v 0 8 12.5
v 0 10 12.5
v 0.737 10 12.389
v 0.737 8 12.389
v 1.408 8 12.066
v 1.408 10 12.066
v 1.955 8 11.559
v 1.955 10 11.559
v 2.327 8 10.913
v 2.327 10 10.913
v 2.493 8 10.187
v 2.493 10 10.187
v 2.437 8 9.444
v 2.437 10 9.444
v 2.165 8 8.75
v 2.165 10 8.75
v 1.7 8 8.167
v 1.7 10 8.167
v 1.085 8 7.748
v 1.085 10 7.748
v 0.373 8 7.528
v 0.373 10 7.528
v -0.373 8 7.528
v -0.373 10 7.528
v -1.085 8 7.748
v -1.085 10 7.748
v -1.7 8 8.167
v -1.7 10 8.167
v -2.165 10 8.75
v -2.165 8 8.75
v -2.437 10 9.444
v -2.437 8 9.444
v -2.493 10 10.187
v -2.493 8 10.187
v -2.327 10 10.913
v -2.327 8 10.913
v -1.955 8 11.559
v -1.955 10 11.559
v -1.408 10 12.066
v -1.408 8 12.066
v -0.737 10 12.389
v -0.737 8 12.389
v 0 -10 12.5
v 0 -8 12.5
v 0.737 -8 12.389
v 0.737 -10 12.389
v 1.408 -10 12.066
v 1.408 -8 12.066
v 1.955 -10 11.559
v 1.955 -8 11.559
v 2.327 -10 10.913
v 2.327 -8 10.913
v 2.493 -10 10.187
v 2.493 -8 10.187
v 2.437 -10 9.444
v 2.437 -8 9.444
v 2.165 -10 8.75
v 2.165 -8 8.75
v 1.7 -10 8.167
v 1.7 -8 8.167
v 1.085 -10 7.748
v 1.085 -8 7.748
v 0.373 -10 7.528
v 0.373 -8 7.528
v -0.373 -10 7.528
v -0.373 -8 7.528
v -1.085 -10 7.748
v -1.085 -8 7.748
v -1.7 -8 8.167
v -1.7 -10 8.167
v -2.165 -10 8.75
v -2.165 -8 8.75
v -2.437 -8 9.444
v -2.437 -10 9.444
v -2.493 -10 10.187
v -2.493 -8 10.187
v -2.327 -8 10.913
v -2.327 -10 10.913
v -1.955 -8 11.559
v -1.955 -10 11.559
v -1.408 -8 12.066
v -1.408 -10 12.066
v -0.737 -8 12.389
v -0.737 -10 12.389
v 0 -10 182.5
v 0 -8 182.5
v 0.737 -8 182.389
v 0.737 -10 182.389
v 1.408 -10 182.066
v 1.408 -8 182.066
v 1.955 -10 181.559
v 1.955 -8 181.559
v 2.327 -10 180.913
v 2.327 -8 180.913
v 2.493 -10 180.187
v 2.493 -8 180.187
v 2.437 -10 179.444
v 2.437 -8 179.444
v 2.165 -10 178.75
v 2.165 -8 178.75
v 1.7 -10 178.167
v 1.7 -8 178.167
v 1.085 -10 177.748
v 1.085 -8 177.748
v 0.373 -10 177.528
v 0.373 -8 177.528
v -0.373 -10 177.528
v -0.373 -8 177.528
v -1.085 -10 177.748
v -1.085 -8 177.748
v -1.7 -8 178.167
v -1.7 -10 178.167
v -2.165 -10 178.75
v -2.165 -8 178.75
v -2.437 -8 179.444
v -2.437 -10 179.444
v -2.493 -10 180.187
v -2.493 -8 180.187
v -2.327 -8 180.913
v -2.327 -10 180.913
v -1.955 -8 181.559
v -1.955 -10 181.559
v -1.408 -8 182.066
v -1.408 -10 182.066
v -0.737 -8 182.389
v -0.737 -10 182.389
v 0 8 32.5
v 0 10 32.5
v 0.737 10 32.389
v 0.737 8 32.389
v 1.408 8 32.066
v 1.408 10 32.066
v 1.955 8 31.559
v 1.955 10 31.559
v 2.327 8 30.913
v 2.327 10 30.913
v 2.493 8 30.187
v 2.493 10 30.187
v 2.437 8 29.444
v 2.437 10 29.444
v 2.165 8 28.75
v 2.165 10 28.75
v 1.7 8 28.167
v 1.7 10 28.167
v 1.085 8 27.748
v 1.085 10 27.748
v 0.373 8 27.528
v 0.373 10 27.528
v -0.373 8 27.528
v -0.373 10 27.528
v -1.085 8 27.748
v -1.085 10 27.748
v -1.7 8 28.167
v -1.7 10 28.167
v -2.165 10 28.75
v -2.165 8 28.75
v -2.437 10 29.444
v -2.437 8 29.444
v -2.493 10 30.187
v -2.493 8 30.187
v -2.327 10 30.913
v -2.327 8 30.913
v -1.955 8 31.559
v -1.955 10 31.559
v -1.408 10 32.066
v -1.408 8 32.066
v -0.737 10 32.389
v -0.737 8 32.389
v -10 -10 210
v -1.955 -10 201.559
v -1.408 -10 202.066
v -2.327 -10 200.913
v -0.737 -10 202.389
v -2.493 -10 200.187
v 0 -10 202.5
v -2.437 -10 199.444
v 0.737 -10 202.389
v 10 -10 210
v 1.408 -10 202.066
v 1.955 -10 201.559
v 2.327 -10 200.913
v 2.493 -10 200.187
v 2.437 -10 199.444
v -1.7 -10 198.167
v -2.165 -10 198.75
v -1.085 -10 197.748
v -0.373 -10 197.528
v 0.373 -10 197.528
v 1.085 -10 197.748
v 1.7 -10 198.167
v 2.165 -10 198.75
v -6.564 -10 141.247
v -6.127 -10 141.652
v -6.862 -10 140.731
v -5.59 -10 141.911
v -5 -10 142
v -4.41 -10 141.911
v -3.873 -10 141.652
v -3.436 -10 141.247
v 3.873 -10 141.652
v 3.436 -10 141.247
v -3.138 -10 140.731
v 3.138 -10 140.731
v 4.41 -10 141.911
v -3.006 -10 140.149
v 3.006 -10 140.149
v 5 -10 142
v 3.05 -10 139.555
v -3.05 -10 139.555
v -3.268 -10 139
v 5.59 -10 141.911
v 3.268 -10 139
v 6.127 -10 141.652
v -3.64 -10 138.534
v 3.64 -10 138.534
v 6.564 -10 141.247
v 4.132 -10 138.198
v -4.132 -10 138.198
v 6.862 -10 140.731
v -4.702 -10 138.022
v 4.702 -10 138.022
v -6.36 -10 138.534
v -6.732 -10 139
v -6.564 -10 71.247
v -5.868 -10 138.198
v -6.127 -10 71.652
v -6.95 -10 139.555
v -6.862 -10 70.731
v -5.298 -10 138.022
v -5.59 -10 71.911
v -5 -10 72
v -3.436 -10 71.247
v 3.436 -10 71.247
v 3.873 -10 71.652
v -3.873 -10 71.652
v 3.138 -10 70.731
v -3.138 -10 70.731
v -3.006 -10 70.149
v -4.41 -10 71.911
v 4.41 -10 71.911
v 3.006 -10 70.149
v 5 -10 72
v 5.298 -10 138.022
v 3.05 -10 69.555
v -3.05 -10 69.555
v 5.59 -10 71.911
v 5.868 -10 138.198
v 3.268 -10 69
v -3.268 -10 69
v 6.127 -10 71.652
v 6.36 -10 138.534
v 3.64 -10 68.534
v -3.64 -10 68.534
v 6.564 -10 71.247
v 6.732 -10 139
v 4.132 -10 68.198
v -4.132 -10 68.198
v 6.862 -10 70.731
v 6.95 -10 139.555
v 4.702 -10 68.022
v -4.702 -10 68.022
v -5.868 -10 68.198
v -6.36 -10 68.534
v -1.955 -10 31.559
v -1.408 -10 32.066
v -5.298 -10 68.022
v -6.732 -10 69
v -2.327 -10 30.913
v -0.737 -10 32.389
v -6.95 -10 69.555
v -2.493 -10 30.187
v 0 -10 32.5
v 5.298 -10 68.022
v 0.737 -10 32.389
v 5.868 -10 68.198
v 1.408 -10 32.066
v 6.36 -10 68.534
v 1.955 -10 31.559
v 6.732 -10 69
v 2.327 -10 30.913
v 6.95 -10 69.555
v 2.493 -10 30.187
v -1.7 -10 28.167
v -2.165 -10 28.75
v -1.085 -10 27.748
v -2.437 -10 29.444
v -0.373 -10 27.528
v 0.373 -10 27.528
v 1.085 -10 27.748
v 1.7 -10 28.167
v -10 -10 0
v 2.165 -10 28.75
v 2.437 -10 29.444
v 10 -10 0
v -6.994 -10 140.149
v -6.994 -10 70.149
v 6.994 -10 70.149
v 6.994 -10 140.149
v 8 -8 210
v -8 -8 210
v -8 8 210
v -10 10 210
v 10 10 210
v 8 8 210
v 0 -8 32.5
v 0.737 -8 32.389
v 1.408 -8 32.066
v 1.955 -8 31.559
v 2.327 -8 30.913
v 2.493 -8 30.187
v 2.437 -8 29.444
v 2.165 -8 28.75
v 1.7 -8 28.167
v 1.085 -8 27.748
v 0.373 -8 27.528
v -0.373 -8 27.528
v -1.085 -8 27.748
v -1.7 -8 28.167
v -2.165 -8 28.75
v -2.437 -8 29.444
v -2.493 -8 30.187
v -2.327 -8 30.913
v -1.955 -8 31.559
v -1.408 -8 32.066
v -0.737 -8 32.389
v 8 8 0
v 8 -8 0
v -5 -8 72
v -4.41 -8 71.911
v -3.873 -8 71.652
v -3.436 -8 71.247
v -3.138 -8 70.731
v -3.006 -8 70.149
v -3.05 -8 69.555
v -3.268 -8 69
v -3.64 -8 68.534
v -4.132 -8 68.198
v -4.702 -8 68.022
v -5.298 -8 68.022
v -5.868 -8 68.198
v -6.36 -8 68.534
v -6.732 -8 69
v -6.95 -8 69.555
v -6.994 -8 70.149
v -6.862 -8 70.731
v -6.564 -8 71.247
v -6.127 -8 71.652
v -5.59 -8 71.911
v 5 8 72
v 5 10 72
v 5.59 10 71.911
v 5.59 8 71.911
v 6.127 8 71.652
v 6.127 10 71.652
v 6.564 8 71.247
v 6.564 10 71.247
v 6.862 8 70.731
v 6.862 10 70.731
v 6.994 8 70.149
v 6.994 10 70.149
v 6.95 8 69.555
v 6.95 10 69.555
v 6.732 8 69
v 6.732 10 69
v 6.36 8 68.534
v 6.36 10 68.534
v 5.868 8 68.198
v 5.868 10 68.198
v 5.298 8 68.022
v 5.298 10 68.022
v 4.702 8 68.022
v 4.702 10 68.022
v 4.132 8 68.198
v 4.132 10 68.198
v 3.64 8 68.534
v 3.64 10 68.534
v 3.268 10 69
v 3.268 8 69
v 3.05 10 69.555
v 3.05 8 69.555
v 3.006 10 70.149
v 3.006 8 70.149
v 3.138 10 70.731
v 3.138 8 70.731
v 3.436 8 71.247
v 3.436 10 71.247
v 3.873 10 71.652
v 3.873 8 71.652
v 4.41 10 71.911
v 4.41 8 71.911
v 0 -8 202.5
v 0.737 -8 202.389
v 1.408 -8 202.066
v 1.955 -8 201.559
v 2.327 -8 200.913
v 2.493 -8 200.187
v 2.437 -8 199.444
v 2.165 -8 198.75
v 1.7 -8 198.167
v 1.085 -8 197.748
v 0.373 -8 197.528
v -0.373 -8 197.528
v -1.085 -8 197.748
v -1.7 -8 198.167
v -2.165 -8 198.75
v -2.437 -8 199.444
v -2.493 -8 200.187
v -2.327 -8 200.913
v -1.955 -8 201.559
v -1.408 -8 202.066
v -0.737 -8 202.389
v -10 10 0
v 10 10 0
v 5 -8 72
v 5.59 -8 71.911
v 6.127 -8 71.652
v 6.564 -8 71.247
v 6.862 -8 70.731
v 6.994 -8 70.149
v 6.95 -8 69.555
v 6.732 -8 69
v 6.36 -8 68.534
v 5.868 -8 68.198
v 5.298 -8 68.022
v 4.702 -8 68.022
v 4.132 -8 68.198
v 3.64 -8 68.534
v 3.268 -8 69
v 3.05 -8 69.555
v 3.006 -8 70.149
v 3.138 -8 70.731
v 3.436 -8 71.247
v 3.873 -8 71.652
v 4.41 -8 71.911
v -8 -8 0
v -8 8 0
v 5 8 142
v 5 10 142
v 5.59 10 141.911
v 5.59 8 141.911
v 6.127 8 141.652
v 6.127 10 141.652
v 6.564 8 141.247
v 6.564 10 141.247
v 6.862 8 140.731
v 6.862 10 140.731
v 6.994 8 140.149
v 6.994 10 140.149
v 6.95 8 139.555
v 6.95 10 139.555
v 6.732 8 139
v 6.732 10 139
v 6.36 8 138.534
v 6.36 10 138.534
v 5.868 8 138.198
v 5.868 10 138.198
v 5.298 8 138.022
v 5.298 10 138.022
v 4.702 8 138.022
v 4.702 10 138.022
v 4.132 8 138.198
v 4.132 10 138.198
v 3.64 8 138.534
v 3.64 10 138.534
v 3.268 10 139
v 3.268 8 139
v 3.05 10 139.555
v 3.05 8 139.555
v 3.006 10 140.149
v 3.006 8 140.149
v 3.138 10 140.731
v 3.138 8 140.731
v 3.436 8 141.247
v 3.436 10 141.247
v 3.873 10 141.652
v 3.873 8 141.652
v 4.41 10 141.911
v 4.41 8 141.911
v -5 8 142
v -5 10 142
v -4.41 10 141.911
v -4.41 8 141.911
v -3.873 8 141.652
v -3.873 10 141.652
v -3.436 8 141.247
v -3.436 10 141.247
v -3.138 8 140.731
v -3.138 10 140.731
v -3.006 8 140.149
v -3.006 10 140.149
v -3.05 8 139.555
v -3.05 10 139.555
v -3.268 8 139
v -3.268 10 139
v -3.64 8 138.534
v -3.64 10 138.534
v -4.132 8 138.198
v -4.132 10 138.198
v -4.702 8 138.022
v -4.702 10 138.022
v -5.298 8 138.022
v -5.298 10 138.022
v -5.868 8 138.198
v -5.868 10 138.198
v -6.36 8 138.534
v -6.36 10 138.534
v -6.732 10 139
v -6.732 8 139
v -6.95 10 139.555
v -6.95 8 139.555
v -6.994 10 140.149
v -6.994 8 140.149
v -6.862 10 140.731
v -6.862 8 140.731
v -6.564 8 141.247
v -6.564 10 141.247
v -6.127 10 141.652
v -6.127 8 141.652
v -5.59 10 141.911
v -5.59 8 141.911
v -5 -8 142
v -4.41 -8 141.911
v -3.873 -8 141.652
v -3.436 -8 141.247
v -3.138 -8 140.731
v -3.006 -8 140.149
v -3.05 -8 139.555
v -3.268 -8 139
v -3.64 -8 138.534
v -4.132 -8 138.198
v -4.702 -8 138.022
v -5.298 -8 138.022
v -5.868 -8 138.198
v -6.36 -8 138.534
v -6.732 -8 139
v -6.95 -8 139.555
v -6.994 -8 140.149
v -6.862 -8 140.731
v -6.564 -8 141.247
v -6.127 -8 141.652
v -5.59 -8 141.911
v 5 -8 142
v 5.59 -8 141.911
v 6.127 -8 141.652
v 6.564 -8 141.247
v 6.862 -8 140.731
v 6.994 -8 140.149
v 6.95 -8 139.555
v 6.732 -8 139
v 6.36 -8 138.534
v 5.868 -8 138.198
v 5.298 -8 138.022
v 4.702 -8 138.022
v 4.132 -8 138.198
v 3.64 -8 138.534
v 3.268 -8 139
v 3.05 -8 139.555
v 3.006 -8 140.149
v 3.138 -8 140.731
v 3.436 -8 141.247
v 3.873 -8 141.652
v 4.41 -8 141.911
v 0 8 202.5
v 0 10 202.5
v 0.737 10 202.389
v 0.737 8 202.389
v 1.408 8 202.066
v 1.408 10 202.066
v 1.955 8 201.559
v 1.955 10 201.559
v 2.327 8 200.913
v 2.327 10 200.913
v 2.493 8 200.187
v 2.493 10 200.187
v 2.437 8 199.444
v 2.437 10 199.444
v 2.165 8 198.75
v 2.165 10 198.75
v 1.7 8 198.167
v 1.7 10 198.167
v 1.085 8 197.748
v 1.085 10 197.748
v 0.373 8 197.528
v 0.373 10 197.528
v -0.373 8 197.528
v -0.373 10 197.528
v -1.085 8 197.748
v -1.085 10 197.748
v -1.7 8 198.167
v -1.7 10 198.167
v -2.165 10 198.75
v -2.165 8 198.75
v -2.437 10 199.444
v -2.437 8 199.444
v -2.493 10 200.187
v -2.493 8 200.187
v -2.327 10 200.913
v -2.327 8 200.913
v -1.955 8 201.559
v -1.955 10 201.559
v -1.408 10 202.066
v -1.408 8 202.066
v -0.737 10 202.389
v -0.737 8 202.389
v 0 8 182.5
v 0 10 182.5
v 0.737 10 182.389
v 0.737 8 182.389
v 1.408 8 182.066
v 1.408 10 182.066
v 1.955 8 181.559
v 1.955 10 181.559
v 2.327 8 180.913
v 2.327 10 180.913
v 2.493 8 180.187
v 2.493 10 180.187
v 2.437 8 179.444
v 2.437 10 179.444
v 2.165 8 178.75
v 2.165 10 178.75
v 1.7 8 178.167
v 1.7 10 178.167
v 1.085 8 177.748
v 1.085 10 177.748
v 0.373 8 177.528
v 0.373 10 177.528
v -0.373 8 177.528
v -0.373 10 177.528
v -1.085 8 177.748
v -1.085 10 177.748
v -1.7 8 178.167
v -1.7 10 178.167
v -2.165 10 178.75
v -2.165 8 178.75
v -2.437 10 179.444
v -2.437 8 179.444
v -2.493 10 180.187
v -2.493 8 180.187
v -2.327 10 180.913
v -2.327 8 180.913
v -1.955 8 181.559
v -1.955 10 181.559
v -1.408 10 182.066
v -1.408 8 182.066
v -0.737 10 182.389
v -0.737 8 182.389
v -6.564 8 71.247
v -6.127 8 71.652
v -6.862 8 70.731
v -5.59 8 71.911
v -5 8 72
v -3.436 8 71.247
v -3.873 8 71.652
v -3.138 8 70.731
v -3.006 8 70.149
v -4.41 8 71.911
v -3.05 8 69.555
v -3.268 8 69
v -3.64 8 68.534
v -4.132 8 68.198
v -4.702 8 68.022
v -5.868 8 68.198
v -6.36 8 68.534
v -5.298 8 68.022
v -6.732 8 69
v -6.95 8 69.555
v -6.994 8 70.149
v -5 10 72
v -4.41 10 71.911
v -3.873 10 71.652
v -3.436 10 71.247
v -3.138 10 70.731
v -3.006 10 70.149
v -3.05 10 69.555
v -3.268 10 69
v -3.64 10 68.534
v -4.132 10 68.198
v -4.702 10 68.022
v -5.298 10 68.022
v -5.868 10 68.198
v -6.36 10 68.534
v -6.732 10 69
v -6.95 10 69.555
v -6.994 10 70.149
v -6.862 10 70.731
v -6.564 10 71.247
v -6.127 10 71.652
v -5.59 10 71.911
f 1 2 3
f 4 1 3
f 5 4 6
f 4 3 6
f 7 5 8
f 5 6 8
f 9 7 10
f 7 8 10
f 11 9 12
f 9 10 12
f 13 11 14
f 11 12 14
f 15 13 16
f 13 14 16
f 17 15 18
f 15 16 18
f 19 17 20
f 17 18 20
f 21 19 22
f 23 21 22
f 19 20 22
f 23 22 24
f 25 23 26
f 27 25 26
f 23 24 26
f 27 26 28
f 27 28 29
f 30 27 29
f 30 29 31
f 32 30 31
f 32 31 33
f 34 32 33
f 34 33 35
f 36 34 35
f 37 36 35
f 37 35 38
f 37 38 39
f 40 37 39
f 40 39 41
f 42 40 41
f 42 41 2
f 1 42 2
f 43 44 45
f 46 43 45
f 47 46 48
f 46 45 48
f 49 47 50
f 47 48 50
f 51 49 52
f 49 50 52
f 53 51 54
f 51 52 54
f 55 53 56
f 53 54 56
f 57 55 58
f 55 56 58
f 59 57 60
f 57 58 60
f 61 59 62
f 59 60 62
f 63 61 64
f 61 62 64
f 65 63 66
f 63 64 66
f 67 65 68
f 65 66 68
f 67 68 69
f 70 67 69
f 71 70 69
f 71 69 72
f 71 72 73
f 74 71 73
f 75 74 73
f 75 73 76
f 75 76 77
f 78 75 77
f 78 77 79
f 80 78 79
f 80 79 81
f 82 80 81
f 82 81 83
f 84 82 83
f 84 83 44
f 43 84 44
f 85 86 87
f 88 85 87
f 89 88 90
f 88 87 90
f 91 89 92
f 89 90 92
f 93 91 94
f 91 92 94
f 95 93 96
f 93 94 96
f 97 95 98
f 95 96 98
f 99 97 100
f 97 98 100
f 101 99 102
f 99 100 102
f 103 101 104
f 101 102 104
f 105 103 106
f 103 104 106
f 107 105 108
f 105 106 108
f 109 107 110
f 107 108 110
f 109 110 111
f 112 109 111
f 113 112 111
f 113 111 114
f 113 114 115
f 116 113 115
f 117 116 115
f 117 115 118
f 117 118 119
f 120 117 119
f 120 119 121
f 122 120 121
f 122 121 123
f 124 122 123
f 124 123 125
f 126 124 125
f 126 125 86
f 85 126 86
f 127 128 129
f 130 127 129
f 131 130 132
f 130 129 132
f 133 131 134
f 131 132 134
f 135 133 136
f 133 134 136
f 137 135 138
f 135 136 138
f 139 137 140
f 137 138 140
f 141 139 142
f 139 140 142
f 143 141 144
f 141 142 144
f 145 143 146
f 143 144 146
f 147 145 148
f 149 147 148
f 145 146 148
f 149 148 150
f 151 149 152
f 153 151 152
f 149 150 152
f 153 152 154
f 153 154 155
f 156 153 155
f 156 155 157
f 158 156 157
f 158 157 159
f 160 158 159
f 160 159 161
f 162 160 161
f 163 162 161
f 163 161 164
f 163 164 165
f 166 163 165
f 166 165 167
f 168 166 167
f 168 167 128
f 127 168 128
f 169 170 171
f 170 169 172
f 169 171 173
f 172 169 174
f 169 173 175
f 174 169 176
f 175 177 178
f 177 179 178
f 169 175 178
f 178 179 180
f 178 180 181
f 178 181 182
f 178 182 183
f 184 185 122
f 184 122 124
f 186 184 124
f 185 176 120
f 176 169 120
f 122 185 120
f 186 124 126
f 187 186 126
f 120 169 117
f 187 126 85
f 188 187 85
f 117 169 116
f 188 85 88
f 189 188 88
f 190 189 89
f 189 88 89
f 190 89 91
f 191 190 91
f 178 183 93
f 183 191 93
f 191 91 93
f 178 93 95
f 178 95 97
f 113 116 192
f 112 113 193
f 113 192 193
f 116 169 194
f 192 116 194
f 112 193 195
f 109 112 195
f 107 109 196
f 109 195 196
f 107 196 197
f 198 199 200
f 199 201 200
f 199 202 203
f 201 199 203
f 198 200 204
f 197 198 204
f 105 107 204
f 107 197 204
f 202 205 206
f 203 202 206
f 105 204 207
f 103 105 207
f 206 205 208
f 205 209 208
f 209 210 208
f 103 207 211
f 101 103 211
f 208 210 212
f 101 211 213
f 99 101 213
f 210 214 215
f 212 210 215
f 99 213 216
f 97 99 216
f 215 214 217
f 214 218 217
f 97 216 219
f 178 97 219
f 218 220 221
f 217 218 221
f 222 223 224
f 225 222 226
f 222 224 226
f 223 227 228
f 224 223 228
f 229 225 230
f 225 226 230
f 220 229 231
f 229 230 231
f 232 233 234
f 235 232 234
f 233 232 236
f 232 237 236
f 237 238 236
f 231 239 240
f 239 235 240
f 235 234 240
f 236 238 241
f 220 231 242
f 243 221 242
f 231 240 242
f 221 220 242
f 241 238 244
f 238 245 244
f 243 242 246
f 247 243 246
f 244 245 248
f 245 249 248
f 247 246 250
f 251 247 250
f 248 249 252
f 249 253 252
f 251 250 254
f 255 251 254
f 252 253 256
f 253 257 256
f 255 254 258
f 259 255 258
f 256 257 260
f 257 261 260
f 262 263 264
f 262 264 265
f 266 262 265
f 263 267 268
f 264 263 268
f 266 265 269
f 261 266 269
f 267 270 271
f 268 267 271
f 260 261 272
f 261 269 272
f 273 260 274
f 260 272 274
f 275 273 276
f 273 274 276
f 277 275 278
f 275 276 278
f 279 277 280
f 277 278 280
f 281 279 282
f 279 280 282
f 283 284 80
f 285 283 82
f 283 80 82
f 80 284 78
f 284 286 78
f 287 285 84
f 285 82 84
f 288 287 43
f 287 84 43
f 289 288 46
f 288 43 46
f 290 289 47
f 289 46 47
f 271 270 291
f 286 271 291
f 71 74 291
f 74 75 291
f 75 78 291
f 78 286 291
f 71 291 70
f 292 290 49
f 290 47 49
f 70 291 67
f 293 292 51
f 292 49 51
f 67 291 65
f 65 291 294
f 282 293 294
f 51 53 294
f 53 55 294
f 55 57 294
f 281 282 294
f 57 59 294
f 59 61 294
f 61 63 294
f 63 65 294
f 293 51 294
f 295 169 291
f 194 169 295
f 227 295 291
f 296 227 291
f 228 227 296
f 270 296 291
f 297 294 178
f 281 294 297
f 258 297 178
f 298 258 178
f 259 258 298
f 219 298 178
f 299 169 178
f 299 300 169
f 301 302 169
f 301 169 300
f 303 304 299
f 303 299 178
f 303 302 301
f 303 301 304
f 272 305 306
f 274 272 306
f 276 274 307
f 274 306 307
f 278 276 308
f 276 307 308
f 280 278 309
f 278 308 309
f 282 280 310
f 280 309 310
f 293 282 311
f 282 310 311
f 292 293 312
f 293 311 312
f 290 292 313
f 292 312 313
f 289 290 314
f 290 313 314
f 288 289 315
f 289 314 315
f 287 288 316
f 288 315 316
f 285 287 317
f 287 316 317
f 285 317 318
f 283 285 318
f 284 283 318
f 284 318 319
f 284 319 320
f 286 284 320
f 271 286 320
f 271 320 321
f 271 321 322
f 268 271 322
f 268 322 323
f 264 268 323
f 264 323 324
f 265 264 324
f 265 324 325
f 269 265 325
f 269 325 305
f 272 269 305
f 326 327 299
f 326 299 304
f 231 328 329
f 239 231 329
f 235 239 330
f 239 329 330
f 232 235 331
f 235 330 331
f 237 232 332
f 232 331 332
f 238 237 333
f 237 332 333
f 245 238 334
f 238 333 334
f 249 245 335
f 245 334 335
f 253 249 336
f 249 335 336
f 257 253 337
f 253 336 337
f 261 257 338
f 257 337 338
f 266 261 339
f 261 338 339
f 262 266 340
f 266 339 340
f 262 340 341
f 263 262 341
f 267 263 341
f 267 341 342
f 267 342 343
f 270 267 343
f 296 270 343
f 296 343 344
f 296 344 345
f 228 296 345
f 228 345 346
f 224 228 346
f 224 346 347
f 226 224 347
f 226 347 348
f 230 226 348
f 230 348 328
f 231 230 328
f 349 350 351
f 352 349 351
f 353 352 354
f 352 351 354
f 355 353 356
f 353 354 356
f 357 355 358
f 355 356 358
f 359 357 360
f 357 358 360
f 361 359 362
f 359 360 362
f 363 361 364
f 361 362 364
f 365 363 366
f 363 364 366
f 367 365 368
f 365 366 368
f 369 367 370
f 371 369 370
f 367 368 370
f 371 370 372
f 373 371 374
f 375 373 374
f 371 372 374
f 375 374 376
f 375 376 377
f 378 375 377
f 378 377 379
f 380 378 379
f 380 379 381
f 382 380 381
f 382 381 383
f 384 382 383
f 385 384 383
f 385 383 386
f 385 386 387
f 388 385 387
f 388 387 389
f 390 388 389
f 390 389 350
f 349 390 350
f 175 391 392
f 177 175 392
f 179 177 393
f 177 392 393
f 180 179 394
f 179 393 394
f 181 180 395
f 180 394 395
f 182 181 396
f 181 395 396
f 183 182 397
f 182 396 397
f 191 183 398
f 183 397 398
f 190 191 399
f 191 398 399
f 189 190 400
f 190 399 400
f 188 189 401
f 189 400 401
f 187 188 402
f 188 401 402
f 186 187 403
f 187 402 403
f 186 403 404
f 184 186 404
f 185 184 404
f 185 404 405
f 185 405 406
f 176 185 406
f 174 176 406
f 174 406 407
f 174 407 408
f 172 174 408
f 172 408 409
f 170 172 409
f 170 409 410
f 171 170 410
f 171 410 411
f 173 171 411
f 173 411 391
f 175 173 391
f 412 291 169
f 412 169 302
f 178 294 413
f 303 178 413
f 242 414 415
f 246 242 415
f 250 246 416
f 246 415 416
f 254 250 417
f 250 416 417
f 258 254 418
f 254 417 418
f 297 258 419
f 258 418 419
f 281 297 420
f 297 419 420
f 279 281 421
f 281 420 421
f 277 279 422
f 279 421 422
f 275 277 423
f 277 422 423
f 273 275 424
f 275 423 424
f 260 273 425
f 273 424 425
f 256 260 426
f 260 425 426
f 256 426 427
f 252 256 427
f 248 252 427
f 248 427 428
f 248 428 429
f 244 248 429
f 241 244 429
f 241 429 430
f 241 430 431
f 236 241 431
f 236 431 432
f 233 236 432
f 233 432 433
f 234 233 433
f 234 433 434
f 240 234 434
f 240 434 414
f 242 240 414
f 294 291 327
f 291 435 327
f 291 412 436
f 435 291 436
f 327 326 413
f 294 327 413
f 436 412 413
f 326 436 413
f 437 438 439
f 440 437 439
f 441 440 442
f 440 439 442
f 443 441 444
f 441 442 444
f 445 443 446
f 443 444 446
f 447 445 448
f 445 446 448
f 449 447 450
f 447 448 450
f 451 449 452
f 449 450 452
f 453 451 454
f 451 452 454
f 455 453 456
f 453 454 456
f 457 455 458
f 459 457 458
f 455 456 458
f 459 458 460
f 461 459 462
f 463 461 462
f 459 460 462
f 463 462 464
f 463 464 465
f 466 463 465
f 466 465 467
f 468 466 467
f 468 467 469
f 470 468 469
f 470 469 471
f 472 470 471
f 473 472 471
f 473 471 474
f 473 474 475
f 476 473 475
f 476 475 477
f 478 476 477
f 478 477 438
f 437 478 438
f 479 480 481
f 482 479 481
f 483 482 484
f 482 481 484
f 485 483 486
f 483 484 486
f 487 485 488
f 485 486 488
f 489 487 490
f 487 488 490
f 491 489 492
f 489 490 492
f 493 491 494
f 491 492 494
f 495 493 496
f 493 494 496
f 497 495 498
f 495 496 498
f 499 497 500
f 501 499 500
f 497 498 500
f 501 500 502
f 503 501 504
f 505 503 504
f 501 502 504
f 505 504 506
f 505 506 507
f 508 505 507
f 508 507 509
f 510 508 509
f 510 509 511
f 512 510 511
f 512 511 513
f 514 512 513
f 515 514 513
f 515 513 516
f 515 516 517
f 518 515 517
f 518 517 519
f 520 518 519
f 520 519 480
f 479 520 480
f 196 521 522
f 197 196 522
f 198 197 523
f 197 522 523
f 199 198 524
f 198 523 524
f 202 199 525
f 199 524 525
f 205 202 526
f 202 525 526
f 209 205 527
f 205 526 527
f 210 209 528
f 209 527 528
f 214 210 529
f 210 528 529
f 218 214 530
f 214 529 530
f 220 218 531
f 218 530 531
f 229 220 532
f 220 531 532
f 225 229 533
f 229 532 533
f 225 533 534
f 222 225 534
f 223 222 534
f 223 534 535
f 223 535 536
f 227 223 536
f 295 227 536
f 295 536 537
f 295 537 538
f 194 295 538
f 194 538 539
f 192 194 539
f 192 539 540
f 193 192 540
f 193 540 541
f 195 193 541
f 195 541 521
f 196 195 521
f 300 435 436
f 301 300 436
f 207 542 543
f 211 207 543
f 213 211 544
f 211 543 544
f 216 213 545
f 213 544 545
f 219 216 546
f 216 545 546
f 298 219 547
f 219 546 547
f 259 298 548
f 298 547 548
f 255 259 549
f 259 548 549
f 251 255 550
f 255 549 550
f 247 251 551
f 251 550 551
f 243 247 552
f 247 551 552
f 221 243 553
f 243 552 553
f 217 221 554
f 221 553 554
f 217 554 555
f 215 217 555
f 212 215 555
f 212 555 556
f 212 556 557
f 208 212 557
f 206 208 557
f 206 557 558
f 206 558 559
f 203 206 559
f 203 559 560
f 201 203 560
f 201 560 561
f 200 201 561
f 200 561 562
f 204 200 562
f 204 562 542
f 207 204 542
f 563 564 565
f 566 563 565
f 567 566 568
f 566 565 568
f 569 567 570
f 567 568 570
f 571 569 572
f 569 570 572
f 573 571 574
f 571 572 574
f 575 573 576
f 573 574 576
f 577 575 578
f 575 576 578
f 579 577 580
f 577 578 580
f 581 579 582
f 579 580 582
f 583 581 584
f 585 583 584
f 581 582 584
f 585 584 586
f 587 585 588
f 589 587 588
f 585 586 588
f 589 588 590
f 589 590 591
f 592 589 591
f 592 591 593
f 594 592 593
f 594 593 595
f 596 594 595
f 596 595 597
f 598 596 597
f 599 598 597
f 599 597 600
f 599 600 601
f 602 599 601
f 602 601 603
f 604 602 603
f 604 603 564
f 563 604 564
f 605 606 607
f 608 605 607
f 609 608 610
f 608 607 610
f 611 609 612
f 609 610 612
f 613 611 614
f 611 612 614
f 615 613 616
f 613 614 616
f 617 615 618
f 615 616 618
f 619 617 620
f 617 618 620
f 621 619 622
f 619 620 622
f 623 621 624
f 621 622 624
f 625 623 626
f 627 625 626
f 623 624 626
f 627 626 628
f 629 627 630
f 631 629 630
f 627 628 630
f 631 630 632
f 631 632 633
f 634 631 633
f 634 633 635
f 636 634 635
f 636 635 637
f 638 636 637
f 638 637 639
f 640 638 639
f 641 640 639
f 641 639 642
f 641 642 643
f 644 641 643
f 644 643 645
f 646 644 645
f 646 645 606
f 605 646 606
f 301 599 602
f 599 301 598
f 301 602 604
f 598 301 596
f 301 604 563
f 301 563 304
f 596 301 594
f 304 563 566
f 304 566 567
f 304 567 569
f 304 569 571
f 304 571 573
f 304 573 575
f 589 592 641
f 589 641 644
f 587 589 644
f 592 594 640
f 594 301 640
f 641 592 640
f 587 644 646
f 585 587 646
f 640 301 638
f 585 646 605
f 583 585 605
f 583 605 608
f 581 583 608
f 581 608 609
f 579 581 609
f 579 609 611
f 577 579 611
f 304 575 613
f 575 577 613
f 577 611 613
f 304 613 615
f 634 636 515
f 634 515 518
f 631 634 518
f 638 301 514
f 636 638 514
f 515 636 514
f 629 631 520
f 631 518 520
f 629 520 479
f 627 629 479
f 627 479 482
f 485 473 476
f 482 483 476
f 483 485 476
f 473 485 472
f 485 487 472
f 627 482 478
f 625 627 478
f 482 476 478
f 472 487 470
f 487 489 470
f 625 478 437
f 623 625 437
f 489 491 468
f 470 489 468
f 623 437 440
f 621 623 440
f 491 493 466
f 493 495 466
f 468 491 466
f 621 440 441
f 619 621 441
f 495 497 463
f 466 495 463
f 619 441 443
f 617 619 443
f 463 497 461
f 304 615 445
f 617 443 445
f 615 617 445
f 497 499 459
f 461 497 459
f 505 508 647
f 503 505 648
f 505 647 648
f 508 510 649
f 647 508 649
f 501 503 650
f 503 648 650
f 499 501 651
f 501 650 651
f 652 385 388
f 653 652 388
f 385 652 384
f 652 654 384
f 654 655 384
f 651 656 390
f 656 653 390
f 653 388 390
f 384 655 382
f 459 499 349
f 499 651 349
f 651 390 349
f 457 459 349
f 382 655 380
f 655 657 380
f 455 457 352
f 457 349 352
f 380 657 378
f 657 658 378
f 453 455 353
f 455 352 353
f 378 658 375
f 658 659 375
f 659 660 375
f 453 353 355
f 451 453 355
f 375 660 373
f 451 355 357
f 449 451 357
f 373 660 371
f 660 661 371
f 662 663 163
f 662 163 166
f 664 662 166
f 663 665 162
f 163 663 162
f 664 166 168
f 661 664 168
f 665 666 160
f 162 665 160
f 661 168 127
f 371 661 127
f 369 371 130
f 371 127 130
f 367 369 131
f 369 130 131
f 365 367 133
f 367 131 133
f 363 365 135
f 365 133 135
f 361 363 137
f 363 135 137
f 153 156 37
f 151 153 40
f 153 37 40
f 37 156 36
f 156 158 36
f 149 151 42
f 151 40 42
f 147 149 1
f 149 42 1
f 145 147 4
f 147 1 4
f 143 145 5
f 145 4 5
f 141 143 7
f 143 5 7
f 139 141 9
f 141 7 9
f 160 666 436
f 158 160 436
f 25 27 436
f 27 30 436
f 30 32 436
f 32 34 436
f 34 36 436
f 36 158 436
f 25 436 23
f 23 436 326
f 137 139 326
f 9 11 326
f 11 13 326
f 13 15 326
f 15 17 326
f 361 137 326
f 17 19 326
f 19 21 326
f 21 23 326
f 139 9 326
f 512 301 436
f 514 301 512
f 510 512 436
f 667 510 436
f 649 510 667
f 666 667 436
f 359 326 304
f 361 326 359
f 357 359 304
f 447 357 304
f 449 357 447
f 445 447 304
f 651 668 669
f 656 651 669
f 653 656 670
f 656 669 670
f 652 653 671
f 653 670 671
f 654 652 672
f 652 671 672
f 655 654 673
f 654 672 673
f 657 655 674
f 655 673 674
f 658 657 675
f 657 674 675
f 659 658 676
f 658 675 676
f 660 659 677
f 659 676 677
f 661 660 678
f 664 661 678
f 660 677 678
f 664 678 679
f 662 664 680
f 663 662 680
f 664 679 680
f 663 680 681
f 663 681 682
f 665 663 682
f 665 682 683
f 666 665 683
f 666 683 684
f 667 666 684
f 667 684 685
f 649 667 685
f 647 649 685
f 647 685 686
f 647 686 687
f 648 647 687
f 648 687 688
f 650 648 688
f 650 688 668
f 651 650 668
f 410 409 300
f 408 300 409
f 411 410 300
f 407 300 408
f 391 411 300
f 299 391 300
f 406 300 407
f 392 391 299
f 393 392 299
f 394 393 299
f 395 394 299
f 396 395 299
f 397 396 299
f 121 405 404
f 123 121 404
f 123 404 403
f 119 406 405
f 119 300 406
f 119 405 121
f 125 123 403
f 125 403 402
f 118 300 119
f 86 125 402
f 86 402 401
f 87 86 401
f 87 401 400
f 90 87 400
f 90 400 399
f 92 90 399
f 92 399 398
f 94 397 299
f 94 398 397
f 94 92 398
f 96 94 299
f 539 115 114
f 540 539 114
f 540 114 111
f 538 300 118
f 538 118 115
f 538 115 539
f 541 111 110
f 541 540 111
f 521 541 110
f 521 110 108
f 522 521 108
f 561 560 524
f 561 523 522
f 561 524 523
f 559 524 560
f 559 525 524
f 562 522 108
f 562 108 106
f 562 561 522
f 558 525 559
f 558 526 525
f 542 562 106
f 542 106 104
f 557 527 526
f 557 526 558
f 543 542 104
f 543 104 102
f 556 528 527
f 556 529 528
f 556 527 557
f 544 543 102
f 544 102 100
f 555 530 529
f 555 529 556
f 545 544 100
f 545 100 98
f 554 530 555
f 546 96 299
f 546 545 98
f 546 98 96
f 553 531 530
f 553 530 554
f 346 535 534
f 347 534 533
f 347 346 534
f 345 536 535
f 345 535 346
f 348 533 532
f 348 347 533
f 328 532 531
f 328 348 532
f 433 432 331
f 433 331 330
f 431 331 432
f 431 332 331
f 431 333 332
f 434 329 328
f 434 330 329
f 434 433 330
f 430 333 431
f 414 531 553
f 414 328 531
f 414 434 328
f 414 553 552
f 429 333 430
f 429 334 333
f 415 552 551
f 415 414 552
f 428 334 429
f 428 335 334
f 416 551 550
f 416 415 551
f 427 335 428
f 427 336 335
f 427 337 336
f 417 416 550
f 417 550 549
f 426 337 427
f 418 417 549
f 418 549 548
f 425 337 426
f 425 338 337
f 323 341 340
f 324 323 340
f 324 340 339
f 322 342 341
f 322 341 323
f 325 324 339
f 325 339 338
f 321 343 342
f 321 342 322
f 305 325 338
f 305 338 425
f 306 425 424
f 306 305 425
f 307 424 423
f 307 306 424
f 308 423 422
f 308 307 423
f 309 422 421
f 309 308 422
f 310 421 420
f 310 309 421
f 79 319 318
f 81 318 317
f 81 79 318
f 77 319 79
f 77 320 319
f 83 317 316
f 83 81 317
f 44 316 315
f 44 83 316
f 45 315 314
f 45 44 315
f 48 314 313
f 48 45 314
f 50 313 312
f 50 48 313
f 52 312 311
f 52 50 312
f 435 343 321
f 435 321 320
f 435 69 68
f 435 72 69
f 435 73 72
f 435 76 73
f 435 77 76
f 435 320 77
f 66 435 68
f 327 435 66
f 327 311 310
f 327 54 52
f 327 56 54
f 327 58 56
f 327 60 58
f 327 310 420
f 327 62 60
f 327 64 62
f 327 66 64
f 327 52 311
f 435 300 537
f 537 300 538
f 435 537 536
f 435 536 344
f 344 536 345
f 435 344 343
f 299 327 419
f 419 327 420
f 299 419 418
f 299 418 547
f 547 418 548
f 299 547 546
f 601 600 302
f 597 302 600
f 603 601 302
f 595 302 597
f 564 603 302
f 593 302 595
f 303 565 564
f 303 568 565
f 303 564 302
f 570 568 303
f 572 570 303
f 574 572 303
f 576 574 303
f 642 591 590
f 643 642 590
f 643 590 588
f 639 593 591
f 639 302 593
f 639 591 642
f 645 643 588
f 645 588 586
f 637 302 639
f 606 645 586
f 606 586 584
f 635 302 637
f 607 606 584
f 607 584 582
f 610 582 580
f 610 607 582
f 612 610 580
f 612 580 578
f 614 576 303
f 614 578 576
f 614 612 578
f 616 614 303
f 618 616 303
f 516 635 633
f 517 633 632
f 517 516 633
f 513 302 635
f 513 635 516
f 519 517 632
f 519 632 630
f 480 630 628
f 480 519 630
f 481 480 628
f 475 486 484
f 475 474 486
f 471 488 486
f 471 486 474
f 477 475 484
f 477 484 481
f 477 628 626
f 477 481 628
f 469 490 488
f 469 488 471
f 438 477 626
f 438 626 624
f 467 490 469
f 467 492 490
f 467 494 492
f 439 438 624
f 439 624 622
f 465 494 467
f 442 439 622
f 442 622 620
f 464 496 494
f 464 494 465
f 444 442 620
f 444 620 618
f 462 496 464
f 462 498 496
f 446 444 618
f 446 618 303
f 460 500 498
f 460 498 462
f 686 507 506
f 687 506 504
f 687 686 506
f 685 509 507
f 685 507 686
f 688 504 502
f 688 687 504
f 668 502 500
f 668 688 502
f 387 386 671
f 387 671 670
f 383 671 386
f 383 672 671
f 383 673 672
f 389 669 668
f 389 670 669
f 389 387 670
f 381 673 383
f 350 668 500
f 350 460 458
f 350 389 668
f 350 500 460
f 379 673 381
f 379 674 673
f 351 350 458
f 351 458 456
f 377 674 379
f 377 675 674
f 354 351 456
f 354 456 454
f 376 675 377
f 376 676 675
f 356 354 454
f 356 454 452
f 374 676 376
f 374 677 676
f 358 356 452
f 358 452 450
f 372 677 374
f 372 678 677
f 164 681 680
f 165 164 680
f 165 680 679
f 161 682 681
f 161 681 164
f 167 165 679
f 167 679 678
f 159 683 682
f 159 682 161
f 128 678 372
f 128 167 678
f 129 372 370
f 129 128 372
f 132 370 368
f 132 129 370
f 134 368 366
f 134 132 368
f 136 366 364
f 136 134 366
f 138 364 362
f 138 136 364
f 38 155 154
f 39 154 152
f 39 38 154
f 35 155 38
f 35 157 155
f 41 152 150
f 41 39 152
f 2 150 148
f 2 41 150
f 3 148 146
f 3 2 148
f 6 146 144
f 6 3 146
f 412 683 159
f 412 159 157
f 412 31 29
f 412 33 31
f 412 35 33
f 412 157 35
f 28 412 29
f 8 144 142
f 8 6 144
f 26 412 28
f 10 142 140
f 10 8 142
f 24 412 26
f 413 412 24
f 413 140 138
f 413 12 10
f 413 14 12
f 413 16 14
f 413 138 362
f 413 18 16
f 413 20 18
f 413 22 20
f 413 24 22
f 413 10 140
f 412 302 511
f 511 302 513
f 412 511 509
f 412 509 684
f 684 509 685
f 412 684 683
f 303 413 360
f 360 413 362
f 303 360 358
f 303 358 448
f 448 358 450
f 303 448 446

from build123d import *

# Parameters (mm, degrees)
SKETCH1_W           = 20
SKETCH1_H           = 20
SKETCH1_W_2         = 16
SKETCH1_H_2         = 16
BOSS_EXTRUDE1_DEPTH = 210
SKETCH2_R           = 2.5
CUT_EXTRUDE1_DEPTH  = 212.187120819
SKETCH3_R           = 2
CUT_EXTRUDE2_DEPTH  = 212.187120819


with BuildPart() as part:
    # Sketch1 → Boss-Extrude1 (new body)
    with BuildSketch(Plane.XY):
        Rectangle(SKETCH1_W, SKETCH1_H)
        Rectangle(SKETCH1_W_2, SKETCH1_H_2, mode=Mode.SUBTRACT)
    extrude(amount=BOSS_EXTRUDE1_DEPTH)

    # Sketch2 → Cut-Extrude1 (cut, through all)
    with BuildSketch(Plane(origin=(0, 10, 0), x_dir=(1, 0, 0), z_dir=(0, 1, 0))):
        with Locations(Location((0, -10, 0), (0, 0, 270))):
            Circle(SKETCH2_R)
        with Locations(Location((0, -30, 0), (0, 0, 270))):
            Circle(SKETCH2_R)
        with Locations(Location((0, -200, 0), (0, 0, 270))):
            Circle(SKETCH2_R)
        with Locations(Location((0, -180, 0), (0, 0, 270))):
            Circle(SKETCH2_R)
    extrude(amount=-CUT_EXTRUDE1_DEPTH, mode=Mode.SUBTRACT)

    # Sketch3 → Cut-Extrude2 (cut, through all)
    with BuildSketch(Plane(origin=(0, 10, 0), x_dir=(1, 0, 0), z_dir=(0, 1, 0))):
        with Locations(Location((-5, -70, 0), (0, 0, 270))):
            Circle(SKETCH3_R)
        with Locations(Location((5, -70, 0), (0, 0, 270))):
            Circle(SKETCH3_R)
        with Locations(Location((5, -140, 0), (0, 0, 270))):
            Circle(SKETCH3_R)
        with Locations(Location((-5, -140, 0), (0, 0, 270))):
            Circle(SKETCH3_R)
    extrude(amount=-CUT_EXTRUDE2_DEPTH, mode=Mode.SUBTRACT)


solid = part.part
